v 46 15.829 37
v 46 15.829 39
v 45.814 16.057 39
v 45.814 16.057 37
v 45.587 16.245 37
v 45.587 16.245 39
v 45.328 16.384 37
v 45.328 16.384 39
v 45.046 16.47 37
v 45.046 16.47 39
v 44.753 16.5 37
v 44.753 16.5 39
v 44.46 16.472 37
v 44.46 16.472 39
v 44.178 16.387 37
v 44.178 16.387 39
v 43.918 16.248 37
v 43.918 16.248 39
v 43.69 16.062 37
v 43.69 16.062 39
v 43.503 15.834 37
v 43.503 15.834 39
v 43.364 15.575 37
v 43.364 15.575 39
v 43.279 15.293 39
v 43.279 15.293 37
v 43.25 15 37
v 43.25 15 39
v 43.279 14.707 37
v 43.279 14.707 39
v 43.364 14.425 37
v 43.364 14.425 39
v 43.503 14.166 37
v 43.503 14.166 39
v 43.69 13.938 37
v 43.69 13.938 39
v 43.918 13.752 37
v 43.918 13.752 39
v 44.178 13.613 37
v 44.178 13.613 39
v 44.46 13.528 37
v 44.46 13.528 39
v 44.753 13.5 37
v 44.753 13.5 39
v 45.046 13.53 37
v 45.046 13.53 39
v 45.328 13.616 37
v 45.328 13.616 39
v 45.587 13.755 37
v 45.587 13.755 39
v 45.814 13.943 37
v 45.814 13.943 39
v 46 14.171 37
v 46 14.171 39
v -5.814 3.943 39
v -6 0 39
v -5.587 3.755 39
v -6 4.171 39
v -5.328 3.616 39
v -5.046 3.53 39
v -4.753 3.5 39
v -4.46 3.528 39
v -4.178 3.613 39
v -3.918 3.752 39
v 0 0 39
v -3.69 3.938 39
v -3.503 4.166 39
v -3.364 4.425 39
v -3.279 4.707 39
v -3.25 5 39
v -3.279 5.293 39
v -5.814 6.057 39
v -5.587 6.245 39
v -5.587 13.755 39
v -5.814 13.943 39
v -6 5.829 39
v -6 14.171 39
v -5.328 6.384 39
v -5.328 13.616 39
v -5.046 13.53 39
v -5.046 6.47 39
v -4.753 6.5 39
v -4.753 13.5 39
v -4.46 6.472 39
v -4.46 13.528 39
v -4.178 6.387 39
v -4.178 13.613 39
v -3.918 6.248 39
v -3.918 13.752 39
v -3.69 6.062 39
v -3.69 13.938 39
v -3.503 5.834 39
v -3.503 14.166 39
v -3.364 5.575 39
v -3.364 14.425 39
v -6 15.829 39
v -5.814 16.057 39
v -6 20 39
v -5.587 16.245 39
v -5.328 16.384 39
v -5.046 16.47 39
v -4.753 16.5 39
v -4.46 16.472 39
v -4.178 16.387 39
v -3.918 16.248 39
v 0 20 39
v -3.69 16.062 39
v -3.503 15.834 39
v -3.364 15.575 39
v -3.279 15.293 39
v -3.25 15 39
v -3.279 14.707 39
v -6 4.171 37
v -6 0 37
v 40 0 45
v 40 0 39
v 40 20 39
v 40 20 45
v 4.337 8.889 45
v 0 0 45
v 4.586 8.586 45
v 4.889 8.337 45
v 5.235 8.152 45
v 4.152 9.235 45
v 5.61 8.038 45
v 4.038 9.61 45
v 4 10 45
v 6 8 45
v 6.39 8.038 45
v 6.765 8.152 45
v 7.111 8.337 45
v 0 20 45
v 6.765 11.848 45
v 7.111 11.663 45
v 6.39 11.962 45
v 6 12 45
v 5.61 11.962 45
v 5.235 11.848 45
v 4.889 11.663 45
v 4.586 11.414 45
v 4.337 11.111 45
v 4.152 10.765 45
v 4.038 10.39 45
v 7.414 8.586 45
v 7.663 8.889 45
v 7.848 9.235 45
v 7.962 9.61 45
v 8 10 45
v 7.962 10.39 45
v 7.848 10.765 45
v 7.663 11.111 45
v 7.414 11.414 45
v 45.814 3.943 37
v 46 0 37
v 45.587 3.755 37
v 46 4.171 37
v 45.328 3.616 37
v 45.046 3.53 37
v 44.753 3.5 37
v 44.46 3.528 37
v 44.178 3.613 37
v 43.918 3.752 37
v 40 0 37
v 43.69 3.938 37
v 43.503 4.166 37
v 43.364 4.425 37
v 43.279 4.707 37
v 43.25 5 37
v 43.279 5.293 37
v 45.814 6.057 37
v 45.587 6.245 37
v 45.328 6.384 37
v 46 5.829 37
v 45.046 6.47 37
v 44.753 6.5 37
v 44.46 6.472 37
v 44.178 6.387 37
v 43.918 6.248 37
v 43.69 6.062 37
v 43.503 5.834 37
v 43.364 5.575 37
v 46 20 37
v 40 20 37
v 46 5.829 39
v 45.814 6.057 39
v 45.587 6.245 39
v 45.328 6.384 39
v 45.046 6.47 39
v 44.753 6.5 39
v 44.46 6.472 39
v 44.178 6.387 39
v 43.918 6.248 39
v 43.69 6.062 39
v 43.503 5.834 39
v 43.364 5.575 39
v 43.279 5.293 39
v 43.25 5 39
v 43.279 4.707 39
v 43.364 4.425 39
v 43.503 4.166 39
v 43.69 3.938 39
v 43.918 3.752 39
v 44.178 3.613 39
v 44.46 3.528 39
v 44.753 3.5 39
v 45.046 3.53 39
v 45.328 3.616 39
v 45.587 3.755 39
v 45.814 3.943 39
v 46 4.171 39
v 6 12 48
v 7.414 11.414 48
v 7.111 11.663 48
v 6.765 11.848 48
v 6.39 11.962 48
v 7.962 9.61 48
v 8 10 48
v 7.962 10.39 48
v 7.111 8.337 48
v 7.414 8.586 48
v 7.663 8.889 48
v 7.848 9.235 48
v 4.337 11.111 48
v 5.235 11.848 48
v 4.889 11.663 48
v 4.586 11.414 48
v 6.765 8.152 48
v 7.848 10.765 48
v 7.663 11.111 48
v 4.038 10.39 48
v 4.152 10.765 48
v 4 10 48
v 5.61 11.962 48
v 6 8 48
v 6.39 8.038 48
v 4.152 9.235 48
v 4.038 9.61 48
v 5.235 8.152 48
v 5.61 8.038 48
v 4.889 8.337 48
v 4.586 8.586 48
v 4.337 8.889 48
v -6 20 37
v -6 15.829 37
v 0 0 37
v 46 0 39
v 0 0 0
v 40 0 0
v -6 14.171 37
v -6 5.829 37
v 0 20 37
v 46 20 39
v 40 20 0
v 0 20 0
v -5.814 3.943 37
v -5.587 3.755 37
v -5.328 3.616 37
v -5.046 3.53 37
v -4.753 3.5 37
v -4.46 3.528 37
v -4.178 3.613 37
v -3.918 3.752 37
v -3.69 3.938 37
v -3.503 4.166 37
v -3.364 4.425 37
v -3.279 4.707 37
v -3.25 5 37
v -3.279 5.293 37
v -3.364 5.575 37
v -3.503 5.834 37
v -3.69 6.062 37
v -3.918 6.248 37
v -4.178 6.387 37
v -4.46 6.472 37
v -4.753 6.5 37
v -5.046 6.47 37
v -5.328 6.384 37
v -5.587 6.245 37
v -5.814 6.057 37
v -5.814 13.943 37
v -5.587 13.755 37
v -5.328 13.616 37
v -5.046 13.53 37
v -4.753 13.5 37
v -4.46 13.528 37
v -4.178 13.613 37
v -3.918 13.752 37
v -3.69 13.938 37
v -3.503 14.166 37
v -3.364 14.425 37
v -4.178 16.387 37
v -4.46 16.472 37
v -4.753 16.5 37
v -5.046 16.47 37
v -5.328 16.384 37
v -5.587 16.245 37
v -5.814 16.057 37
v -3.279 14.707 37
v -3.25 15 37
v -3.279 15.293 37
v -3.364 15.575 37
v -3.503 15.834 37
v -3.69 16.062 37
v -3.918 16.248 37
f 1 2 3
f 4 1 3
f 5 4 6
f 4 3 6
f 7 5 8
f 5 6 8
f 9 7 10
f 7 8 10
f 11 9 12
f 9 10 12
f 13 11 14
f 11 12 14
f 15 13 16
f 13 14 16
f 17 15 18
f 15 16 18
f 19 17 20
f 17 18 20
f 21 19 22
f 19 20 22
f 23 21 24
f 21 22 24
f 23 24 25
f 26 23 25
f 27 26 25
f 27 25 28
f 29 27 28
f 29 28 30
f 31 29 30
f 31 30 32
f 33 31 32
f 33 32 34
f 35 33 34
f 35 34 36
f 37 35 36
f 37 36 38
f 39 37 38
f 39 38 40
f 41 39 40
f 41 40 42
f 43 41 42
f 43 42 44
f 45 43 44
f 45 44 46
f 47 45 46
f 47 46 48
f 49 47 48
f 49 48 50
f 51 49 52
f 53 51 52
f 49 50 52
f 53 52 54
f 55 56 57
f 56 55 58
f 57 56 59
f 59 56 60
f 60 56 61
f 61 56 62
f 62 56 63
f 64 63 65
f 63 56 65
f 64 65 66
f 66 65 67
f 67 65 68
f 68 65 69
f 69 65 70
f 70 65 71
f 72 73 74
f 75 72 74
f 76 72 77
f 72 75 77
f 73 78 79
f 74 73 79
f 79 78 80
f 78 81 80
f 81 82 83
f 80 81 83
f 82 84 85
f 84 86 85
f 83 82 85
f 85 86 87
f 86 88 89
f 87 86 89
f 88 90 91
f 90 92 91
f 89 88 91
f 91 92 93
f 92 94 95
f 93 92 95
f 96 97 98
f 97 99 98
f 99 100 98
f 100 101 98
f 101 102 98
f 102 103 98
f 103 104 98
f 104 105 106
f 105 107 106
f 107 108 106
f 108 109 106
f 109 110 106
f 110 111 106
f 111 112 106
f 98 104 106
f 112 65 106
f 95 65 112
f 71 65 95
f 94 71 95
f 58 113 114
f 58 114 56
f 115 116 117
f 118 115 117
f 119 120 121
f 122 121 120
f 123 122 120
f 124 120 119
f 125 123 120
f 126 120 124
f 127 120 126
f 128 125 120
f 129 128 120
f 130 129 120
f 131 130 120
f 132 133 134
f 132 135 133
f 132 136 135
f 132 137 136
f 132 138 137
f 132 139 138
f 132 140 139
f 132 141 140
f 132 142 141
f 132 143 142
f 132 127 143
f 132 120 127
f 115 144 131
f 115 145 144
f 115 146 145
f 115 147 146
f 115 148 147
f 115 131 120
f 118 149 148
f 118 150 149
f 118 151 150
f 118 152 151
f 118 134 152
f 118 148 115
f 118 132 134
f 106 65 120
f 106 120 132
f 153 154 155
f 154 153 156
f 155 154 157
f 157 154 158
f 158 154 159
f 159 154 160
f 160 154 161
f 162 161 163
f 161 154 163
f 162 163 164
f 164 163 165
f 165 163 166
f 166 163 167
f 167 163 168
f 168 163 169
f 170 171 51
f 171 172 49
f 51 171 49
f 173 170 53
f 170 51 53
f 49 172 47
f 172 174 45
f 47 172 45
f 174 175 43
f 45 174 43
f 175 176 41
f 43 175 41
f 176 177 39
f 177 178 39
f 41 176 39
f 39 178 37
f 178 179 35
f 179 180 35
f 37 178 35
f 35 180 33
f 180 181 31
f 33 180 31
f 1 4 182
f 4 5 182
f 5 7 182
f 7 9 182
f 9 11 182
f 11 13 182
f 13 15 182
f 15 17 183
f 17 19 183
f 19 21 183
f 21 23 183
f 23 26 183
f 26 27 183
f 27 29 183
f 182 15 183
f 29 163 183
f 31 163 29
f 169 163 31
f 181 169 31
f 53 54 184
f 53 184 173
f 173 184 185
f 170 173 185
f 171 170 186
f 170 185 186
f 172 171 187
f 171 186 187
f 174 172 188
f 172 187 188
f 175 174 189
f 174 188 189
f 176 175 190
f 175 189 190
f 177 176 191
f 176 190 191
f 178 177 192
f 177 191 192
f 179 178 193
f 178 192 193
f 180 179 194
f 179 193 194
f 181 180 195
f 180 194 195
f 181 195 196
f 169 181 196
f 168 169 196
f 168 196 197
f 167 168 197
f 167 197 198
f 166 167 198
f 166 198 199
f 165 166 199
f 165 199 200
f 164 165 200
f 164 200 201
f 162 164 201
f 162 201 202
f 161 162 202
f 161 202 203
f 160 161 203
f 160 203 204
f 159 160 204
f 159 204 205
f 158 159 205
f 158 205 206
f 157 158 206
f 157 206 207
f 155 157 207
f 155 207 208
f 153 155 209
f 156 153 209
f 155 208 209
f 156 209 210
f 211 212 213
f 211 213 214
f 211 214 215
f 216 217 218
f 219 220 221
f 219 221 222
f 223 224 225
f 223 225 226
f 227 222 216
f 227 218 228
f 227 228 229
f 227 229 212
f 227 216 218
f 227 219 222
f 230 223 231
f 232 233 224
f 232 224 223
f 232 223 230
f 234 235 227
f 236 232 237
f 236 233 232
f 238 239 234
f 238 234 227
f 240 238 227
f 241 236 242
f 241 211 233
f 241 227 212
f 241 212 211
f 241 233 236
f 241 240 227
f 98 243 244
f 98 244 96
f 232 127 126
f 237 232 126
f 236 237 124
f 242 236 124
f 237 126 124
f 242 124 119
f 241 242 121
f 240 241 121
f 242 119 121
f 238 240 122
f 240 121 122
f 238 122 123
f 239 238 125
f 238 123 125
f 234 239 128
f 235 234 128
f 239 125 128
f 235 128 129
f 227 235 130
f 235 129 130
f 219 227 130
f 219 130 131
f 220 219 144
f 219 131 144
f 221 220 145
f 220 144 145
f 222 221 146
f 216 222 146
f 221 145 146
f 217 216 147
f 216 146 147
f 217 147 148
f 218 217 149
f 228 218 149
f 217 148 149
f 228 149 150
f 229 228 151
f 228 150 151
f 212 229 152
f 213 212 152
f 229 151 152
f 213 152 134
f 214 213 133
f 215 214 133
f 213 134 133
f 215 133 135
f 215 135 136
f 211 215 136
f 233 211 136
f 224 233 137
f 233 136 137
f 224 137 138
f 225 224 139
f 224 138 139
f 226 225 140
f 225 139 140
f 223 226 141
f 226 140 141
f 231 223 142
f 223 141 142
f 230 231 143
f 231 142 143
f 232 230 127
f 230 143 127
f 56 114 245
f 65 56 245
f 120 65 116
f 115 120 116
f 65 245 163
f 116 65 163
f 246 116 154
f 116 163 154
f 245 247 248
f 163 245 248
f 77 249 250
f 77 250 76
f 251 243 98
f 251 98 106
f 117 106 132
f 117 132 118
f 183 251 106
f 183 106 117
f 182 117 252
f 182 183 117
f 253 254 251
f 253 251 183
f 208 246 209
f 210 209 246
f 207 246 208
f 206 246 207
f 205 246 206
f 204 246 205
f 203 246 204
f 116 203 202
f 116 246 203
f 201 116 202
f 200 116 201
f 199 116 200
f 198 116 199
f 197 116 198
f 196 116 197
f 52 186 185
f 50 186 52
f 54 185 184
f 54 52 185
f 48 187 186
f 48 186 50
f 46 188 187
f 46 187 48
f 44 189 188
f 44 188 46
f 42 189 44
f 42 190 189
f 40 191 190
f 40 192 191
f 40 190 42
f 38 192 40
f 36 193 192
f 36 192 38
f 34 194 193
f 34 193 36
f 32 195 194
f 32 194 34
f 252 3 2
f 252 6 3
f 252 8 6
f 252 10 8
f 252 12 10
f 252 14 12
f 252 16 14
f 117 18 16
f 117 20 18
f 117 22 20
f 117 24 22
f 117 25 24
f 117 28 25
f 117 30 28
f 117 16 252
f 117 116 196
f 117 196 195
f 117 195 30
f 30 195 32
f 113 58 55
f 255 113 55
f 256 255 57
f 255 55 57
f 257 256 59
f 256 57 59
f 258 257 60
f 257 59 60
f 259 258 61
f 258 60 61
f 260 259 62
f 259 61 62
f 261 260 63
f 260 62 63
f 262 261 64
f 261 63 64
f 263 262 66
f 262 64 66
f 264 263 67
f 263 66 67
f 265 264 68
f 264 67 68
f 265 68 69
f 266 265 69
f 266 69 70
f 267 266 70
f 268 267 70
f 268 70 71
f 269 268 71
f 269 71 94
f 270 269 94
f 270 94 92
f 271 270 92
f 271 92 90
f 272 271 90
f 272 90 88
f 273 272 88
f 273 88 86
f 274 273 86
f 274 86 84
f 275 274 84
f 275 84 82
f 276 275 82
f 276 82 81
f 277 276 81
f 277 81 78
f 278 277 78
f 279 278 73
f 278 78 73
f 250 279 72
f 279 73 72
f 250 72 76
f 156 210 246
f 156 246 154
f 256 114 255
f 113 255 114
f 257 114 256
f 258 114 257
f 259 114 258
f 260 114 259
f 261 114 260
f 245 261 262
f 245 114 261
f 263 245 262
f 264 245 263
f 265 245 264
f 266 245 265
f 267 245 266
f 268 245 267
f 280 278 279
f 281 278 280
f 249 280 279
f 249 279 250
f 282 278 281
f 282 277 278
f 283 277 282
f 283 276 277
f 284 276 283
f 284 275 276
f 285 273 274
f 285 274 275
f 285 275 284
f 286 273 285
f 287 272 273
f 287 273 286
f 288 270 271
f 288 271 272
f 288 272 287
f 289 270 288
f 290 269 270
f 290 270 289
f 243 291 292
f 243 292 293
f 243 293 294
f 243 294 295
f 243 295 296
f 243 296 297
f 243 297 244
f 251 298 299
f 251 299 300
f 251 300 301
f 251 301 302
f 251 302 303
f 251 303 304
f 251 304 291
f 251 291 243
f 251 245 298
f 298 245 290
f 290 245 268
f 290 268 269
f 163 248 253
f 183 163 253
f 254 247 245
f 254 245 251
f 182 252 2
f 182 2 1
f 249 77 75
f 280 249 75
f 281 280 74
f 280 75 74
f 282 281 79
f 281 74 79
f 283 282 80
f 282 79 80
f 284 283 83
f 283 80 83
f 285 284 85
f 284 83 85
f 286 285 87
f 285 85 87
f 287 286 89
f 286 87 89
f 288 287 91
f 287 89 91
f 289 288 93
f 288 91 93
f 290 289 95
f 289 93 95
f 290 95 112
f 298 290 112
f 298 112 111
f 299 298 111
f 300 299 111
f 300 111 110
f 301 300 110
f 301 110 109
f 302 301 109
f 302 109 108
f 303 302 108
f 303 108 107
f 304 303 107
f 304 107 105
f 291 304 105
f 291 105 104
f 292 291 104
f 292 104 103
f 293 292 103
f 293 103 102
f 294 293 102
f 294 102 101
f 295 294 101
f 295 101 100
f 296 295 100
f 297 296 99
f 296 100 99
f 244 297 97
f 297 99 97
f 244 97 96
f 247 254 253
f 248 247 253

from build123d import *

# Parameters (mm, degrees)
ESQUISSE1_W             = 40
ESQUISSE1_H             = 20
BOSS_EXTRU_1_DEPTH      = 45
ESQUISSE2_R             = 2
BOSS_EXTRU_2_DEPTH      = 3
ESQUISSE3_W             = 2
ESQUISSE3_H             = 20
BOSS_EXTRU_3_DEPTH      = 6
ESQUISSE4_W             = 2
ESQUISSE4_H             = 20
BOSS_EXTRU_4_DEPTH      = 6
ESQUISSE5_R             = 1.5
ENL_V_MAT_EXTRU_1_DEPTH = 6


with BuildPart() as part:
    # Esquisse1 → Boss.-Extru.1 (new body)
    with BuildSketch(Plane.XY):
        with Locations((20, 10)):
            Rectangle(ESQUISSE1_W, ESQUISSE1_H)
    extrude(amount=BOSS_EXTRU_1_DEPTH)

    # Esquisse2 → Boss.-Extru.2 (add)
    with BuildSketch(Plane.XY.offset(45)):
        with Locations(Location((6, 10, 0), (0, 0, 180))):
            Circle(ESQUISSE2_R)
    extrude(amount=BOSS_EXTRU_2_DEPTH)

    # Esquisse3 → Boss.-Extru.3 (add)
    with BuildSketch(Plane.ZY):
        with Locations((38, 10)):
            Rectangle(ESQUISSE3_W, ESQUISSE3_H)
    extrude(amount=BOSS_EXTRU_3_DEPTH)

    # Esquisse4 → Boss.-Extru.4 (add)
    with BuildSketch(Plane(origin=(40, 0, 0), x_dir=(0, 0, -1), z_dir=(1, 0, 0))):
        with Locations((-38, 10)):
            Rectangle(ESQUISSE4_W, ESQUISSE4_H)
    extrude(amount=BOSS_EXTRU_4_DEPTH)

    # Esquisse5 → Enlèv. mat.-Extru.1 (cut)
    with BuildSketch(Plane.XY.offset(39)):
        with Locations((-4.75, 15)):
            Circle(ESQUISSE5_R)
        with Locations((44.75, 15)):
            Circle(ESQUISSE5_R)
        with Locations((44.75, 5)):
            Circle(ESQUISSE5_R)
        with Locations((-4.75, 5)):
            Circle(ESQUISSE5_R)
    extrude(amount=-ENL_V_MAT_EXTRU_1_DEPTH, mode=Mode.SUBTRACT)


solid = part.part
